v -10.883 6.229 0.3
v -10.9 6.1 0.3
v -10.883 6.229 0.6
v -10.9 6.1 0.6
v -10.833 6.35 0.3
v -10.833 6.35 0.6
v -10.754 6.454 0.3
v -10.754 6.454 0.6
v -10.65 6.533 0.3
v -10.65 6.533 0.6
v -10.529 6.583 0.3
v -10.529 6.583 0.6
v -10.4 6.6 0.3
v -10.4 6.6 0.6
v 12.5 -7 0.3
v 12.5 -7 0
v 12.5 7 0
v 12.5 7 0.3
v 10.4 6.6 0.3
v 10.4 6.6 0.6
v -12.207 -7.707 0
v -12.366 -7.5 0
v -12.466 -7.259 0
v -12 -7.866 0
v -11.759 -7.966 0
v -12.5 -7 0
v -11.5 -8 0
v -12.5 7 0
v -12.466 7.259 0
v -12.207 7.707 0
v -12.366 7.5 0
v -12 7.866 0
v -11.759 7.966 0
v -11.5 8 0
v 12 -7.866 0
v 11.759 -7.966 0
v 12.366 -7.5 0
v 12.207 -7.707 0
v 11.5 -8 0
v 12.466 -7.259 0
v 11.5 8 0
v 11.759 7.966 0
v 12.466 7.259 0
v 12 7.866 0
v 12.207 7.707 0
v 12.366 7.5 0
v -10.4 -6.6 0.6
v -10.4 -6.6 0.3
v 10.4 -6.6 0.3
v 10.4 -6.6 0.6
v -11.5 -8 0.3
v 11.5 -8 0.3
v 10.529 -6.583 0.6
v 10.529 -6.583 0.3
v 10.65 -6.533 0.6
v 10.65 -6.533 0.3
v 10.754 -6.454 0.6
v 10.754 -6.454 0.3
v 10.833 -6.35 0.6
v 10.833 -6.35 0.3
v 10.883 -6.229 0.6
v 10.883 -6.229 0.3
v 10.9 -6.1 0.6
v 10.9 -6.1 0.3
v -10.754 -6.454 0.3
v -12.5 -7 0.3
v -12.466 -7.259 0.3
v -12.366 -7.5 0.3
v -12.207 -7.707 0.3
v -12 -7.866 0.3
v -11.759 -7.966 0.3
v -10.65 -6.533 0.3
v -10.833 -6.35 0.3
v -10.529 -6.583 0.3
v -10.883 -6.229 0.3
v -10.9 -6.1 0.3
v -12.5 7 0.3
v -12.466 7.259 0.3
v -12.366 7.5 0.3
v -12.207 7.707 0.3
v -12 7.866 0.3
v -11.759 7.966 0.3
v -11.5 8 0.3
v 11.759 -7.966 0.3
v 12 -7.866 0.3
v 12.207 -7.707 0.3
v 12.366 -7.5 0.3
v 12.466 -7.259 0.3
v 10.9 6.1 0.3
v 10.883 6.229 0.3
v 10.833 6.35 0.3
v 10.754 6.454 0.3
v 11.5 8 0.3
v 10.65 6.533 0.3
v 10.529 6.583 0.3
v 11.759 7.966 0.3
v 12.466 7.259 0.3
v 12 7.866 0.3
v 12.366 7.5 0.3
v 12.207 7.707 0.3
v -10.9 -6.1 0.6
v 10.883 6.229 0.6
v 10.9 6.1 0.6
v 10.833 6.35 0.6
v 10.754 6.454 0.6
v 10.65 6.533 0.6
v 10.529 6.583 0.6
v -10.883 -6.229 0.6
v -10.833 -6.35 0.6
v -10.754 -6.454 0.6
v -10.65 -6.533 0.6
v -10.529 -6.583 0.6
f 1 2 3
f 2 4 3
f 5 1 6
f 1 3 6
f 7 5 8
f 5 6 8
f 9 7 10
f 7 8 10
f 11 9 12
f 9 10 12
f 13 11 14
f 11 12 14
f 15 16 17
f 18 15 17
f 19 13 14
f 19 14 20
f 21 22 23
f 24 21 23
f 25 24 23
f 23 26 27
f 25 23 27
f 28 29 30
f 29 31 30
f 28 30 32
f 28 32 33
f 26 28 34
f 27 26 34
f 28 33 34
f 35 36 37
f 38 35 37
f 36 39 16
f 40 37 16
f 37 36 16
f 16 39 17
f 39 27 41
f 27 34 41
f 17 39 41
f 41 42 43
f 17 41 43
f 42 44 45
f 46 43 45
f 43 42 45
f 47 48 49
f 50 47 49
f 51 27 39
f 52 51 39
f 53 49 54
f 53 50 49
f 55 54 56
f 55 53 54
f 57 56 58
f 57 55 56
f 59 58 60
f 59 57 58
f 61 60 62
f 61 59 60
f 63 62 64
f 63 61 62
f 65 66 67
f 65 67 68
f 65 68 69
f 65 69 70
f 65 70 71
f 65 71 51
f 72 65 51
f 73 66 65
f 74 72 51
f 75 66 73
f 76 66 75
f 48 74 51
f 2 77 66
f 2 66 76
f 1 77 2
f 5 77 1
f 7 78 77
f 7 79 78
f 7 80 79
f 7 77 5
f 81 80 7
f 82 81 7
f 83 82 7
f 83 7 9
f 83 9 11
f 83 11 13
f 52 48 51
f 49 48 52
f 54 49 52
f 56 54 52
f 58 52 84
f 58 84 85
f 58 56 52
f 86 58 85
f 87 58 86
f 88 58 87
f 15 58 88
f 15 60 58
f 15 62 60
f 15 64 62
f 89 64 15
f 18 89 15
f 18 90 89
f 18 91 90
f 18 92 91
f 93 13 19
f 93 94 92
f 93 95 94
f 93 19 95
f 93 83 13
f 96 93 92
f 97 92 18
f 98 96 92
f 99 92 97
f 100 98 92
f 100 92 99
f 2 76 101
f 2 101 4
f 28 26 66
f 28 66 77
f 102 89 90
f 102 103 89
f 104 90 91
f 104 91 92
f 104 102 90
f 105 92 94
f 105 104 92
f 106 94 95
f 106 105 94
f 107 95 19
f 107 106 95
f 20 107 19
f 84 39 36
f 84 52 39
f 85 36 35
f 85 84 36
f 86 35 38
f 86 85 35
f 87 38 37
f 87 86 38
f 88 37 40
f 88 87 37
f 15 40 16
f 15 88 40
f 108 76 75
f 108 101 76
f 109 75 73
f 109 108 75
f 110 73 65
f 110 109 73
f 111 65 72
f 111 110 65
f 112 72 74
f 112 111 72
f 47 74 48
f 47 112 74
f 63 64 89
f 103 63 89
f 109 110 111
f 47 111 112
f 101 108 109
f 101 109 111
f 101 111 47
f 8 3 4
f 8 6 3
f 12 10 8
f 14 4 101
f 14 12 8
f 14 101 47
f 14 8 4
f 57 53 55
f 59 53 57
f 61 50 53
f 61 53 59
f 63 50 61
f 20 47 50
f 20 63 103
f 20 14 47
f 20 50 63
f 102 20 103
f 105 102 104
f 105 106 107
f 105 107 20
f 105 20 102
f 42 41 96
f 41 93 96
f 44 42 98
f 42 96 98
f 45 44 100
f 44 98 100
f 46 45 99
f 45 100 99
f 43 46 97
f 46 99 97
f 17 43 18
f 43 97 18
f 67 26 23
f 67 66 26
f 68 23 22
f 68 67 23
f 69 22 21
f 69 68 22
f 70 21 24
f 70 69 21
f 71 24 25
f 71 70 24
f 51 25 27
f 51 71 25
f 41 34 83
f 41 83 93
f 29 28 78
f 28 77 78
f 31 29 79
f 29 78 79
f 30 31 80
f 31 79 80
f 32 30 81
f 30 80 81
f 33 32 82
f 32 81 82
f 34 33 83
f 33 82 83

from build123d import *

# Parameters (mm, degrees)
F0_W     = 25
F0_H     = 16
F0_W_2   = 21.8
F0_H_2   = 13.2
F1_DEPTH = 0.3
F2_DEPTH = 0.6
F3_R     = 1
F4_R     = 0.5


with BuildPart() as f1:
    # F0 (on Top) → F1 (new body)
    with BuildSketch(Plane.XY):
        Rectangle(F0_W, F0_H)
        Rectangle(F0_W_2, F0_H_2, mode=Mode.SUBTRACT)
        Rectangle(F0_W_2, F0_H_2)
    extrude(amount=F1_DEPTH)

    # F0 (on Top) → F2 (join)
    with BuildSketch(Plane.XY):
        Rectangle(F0_W_2, F0_H_2)
    extrude(amount=F2_DEPTH)

    # F3
    f3_edges = [f1.edges().sort_by_distance(p)[0] for p in [
        (-12.5, 8, 0.15),
        (-12.5, -8, 0.15),
        (12.5, -8, 0.15),
        (12.5, 8, 0.15),
    ]]
    fillet(f3_edges, radius=F3_R)

    # F4
    f4_edges = [f1.edges().sort_by_distance(p)[0] for p in [
        (-10.9, -6.6, 0.45),
        (10.9, -6.6, 0.45),
        (-10.9, 6.6, 0.45),
        (10.9, 6.6, 0.45),
    ]]
    fillet(f4_edges, radius=F4_R)


solid = f1.part
